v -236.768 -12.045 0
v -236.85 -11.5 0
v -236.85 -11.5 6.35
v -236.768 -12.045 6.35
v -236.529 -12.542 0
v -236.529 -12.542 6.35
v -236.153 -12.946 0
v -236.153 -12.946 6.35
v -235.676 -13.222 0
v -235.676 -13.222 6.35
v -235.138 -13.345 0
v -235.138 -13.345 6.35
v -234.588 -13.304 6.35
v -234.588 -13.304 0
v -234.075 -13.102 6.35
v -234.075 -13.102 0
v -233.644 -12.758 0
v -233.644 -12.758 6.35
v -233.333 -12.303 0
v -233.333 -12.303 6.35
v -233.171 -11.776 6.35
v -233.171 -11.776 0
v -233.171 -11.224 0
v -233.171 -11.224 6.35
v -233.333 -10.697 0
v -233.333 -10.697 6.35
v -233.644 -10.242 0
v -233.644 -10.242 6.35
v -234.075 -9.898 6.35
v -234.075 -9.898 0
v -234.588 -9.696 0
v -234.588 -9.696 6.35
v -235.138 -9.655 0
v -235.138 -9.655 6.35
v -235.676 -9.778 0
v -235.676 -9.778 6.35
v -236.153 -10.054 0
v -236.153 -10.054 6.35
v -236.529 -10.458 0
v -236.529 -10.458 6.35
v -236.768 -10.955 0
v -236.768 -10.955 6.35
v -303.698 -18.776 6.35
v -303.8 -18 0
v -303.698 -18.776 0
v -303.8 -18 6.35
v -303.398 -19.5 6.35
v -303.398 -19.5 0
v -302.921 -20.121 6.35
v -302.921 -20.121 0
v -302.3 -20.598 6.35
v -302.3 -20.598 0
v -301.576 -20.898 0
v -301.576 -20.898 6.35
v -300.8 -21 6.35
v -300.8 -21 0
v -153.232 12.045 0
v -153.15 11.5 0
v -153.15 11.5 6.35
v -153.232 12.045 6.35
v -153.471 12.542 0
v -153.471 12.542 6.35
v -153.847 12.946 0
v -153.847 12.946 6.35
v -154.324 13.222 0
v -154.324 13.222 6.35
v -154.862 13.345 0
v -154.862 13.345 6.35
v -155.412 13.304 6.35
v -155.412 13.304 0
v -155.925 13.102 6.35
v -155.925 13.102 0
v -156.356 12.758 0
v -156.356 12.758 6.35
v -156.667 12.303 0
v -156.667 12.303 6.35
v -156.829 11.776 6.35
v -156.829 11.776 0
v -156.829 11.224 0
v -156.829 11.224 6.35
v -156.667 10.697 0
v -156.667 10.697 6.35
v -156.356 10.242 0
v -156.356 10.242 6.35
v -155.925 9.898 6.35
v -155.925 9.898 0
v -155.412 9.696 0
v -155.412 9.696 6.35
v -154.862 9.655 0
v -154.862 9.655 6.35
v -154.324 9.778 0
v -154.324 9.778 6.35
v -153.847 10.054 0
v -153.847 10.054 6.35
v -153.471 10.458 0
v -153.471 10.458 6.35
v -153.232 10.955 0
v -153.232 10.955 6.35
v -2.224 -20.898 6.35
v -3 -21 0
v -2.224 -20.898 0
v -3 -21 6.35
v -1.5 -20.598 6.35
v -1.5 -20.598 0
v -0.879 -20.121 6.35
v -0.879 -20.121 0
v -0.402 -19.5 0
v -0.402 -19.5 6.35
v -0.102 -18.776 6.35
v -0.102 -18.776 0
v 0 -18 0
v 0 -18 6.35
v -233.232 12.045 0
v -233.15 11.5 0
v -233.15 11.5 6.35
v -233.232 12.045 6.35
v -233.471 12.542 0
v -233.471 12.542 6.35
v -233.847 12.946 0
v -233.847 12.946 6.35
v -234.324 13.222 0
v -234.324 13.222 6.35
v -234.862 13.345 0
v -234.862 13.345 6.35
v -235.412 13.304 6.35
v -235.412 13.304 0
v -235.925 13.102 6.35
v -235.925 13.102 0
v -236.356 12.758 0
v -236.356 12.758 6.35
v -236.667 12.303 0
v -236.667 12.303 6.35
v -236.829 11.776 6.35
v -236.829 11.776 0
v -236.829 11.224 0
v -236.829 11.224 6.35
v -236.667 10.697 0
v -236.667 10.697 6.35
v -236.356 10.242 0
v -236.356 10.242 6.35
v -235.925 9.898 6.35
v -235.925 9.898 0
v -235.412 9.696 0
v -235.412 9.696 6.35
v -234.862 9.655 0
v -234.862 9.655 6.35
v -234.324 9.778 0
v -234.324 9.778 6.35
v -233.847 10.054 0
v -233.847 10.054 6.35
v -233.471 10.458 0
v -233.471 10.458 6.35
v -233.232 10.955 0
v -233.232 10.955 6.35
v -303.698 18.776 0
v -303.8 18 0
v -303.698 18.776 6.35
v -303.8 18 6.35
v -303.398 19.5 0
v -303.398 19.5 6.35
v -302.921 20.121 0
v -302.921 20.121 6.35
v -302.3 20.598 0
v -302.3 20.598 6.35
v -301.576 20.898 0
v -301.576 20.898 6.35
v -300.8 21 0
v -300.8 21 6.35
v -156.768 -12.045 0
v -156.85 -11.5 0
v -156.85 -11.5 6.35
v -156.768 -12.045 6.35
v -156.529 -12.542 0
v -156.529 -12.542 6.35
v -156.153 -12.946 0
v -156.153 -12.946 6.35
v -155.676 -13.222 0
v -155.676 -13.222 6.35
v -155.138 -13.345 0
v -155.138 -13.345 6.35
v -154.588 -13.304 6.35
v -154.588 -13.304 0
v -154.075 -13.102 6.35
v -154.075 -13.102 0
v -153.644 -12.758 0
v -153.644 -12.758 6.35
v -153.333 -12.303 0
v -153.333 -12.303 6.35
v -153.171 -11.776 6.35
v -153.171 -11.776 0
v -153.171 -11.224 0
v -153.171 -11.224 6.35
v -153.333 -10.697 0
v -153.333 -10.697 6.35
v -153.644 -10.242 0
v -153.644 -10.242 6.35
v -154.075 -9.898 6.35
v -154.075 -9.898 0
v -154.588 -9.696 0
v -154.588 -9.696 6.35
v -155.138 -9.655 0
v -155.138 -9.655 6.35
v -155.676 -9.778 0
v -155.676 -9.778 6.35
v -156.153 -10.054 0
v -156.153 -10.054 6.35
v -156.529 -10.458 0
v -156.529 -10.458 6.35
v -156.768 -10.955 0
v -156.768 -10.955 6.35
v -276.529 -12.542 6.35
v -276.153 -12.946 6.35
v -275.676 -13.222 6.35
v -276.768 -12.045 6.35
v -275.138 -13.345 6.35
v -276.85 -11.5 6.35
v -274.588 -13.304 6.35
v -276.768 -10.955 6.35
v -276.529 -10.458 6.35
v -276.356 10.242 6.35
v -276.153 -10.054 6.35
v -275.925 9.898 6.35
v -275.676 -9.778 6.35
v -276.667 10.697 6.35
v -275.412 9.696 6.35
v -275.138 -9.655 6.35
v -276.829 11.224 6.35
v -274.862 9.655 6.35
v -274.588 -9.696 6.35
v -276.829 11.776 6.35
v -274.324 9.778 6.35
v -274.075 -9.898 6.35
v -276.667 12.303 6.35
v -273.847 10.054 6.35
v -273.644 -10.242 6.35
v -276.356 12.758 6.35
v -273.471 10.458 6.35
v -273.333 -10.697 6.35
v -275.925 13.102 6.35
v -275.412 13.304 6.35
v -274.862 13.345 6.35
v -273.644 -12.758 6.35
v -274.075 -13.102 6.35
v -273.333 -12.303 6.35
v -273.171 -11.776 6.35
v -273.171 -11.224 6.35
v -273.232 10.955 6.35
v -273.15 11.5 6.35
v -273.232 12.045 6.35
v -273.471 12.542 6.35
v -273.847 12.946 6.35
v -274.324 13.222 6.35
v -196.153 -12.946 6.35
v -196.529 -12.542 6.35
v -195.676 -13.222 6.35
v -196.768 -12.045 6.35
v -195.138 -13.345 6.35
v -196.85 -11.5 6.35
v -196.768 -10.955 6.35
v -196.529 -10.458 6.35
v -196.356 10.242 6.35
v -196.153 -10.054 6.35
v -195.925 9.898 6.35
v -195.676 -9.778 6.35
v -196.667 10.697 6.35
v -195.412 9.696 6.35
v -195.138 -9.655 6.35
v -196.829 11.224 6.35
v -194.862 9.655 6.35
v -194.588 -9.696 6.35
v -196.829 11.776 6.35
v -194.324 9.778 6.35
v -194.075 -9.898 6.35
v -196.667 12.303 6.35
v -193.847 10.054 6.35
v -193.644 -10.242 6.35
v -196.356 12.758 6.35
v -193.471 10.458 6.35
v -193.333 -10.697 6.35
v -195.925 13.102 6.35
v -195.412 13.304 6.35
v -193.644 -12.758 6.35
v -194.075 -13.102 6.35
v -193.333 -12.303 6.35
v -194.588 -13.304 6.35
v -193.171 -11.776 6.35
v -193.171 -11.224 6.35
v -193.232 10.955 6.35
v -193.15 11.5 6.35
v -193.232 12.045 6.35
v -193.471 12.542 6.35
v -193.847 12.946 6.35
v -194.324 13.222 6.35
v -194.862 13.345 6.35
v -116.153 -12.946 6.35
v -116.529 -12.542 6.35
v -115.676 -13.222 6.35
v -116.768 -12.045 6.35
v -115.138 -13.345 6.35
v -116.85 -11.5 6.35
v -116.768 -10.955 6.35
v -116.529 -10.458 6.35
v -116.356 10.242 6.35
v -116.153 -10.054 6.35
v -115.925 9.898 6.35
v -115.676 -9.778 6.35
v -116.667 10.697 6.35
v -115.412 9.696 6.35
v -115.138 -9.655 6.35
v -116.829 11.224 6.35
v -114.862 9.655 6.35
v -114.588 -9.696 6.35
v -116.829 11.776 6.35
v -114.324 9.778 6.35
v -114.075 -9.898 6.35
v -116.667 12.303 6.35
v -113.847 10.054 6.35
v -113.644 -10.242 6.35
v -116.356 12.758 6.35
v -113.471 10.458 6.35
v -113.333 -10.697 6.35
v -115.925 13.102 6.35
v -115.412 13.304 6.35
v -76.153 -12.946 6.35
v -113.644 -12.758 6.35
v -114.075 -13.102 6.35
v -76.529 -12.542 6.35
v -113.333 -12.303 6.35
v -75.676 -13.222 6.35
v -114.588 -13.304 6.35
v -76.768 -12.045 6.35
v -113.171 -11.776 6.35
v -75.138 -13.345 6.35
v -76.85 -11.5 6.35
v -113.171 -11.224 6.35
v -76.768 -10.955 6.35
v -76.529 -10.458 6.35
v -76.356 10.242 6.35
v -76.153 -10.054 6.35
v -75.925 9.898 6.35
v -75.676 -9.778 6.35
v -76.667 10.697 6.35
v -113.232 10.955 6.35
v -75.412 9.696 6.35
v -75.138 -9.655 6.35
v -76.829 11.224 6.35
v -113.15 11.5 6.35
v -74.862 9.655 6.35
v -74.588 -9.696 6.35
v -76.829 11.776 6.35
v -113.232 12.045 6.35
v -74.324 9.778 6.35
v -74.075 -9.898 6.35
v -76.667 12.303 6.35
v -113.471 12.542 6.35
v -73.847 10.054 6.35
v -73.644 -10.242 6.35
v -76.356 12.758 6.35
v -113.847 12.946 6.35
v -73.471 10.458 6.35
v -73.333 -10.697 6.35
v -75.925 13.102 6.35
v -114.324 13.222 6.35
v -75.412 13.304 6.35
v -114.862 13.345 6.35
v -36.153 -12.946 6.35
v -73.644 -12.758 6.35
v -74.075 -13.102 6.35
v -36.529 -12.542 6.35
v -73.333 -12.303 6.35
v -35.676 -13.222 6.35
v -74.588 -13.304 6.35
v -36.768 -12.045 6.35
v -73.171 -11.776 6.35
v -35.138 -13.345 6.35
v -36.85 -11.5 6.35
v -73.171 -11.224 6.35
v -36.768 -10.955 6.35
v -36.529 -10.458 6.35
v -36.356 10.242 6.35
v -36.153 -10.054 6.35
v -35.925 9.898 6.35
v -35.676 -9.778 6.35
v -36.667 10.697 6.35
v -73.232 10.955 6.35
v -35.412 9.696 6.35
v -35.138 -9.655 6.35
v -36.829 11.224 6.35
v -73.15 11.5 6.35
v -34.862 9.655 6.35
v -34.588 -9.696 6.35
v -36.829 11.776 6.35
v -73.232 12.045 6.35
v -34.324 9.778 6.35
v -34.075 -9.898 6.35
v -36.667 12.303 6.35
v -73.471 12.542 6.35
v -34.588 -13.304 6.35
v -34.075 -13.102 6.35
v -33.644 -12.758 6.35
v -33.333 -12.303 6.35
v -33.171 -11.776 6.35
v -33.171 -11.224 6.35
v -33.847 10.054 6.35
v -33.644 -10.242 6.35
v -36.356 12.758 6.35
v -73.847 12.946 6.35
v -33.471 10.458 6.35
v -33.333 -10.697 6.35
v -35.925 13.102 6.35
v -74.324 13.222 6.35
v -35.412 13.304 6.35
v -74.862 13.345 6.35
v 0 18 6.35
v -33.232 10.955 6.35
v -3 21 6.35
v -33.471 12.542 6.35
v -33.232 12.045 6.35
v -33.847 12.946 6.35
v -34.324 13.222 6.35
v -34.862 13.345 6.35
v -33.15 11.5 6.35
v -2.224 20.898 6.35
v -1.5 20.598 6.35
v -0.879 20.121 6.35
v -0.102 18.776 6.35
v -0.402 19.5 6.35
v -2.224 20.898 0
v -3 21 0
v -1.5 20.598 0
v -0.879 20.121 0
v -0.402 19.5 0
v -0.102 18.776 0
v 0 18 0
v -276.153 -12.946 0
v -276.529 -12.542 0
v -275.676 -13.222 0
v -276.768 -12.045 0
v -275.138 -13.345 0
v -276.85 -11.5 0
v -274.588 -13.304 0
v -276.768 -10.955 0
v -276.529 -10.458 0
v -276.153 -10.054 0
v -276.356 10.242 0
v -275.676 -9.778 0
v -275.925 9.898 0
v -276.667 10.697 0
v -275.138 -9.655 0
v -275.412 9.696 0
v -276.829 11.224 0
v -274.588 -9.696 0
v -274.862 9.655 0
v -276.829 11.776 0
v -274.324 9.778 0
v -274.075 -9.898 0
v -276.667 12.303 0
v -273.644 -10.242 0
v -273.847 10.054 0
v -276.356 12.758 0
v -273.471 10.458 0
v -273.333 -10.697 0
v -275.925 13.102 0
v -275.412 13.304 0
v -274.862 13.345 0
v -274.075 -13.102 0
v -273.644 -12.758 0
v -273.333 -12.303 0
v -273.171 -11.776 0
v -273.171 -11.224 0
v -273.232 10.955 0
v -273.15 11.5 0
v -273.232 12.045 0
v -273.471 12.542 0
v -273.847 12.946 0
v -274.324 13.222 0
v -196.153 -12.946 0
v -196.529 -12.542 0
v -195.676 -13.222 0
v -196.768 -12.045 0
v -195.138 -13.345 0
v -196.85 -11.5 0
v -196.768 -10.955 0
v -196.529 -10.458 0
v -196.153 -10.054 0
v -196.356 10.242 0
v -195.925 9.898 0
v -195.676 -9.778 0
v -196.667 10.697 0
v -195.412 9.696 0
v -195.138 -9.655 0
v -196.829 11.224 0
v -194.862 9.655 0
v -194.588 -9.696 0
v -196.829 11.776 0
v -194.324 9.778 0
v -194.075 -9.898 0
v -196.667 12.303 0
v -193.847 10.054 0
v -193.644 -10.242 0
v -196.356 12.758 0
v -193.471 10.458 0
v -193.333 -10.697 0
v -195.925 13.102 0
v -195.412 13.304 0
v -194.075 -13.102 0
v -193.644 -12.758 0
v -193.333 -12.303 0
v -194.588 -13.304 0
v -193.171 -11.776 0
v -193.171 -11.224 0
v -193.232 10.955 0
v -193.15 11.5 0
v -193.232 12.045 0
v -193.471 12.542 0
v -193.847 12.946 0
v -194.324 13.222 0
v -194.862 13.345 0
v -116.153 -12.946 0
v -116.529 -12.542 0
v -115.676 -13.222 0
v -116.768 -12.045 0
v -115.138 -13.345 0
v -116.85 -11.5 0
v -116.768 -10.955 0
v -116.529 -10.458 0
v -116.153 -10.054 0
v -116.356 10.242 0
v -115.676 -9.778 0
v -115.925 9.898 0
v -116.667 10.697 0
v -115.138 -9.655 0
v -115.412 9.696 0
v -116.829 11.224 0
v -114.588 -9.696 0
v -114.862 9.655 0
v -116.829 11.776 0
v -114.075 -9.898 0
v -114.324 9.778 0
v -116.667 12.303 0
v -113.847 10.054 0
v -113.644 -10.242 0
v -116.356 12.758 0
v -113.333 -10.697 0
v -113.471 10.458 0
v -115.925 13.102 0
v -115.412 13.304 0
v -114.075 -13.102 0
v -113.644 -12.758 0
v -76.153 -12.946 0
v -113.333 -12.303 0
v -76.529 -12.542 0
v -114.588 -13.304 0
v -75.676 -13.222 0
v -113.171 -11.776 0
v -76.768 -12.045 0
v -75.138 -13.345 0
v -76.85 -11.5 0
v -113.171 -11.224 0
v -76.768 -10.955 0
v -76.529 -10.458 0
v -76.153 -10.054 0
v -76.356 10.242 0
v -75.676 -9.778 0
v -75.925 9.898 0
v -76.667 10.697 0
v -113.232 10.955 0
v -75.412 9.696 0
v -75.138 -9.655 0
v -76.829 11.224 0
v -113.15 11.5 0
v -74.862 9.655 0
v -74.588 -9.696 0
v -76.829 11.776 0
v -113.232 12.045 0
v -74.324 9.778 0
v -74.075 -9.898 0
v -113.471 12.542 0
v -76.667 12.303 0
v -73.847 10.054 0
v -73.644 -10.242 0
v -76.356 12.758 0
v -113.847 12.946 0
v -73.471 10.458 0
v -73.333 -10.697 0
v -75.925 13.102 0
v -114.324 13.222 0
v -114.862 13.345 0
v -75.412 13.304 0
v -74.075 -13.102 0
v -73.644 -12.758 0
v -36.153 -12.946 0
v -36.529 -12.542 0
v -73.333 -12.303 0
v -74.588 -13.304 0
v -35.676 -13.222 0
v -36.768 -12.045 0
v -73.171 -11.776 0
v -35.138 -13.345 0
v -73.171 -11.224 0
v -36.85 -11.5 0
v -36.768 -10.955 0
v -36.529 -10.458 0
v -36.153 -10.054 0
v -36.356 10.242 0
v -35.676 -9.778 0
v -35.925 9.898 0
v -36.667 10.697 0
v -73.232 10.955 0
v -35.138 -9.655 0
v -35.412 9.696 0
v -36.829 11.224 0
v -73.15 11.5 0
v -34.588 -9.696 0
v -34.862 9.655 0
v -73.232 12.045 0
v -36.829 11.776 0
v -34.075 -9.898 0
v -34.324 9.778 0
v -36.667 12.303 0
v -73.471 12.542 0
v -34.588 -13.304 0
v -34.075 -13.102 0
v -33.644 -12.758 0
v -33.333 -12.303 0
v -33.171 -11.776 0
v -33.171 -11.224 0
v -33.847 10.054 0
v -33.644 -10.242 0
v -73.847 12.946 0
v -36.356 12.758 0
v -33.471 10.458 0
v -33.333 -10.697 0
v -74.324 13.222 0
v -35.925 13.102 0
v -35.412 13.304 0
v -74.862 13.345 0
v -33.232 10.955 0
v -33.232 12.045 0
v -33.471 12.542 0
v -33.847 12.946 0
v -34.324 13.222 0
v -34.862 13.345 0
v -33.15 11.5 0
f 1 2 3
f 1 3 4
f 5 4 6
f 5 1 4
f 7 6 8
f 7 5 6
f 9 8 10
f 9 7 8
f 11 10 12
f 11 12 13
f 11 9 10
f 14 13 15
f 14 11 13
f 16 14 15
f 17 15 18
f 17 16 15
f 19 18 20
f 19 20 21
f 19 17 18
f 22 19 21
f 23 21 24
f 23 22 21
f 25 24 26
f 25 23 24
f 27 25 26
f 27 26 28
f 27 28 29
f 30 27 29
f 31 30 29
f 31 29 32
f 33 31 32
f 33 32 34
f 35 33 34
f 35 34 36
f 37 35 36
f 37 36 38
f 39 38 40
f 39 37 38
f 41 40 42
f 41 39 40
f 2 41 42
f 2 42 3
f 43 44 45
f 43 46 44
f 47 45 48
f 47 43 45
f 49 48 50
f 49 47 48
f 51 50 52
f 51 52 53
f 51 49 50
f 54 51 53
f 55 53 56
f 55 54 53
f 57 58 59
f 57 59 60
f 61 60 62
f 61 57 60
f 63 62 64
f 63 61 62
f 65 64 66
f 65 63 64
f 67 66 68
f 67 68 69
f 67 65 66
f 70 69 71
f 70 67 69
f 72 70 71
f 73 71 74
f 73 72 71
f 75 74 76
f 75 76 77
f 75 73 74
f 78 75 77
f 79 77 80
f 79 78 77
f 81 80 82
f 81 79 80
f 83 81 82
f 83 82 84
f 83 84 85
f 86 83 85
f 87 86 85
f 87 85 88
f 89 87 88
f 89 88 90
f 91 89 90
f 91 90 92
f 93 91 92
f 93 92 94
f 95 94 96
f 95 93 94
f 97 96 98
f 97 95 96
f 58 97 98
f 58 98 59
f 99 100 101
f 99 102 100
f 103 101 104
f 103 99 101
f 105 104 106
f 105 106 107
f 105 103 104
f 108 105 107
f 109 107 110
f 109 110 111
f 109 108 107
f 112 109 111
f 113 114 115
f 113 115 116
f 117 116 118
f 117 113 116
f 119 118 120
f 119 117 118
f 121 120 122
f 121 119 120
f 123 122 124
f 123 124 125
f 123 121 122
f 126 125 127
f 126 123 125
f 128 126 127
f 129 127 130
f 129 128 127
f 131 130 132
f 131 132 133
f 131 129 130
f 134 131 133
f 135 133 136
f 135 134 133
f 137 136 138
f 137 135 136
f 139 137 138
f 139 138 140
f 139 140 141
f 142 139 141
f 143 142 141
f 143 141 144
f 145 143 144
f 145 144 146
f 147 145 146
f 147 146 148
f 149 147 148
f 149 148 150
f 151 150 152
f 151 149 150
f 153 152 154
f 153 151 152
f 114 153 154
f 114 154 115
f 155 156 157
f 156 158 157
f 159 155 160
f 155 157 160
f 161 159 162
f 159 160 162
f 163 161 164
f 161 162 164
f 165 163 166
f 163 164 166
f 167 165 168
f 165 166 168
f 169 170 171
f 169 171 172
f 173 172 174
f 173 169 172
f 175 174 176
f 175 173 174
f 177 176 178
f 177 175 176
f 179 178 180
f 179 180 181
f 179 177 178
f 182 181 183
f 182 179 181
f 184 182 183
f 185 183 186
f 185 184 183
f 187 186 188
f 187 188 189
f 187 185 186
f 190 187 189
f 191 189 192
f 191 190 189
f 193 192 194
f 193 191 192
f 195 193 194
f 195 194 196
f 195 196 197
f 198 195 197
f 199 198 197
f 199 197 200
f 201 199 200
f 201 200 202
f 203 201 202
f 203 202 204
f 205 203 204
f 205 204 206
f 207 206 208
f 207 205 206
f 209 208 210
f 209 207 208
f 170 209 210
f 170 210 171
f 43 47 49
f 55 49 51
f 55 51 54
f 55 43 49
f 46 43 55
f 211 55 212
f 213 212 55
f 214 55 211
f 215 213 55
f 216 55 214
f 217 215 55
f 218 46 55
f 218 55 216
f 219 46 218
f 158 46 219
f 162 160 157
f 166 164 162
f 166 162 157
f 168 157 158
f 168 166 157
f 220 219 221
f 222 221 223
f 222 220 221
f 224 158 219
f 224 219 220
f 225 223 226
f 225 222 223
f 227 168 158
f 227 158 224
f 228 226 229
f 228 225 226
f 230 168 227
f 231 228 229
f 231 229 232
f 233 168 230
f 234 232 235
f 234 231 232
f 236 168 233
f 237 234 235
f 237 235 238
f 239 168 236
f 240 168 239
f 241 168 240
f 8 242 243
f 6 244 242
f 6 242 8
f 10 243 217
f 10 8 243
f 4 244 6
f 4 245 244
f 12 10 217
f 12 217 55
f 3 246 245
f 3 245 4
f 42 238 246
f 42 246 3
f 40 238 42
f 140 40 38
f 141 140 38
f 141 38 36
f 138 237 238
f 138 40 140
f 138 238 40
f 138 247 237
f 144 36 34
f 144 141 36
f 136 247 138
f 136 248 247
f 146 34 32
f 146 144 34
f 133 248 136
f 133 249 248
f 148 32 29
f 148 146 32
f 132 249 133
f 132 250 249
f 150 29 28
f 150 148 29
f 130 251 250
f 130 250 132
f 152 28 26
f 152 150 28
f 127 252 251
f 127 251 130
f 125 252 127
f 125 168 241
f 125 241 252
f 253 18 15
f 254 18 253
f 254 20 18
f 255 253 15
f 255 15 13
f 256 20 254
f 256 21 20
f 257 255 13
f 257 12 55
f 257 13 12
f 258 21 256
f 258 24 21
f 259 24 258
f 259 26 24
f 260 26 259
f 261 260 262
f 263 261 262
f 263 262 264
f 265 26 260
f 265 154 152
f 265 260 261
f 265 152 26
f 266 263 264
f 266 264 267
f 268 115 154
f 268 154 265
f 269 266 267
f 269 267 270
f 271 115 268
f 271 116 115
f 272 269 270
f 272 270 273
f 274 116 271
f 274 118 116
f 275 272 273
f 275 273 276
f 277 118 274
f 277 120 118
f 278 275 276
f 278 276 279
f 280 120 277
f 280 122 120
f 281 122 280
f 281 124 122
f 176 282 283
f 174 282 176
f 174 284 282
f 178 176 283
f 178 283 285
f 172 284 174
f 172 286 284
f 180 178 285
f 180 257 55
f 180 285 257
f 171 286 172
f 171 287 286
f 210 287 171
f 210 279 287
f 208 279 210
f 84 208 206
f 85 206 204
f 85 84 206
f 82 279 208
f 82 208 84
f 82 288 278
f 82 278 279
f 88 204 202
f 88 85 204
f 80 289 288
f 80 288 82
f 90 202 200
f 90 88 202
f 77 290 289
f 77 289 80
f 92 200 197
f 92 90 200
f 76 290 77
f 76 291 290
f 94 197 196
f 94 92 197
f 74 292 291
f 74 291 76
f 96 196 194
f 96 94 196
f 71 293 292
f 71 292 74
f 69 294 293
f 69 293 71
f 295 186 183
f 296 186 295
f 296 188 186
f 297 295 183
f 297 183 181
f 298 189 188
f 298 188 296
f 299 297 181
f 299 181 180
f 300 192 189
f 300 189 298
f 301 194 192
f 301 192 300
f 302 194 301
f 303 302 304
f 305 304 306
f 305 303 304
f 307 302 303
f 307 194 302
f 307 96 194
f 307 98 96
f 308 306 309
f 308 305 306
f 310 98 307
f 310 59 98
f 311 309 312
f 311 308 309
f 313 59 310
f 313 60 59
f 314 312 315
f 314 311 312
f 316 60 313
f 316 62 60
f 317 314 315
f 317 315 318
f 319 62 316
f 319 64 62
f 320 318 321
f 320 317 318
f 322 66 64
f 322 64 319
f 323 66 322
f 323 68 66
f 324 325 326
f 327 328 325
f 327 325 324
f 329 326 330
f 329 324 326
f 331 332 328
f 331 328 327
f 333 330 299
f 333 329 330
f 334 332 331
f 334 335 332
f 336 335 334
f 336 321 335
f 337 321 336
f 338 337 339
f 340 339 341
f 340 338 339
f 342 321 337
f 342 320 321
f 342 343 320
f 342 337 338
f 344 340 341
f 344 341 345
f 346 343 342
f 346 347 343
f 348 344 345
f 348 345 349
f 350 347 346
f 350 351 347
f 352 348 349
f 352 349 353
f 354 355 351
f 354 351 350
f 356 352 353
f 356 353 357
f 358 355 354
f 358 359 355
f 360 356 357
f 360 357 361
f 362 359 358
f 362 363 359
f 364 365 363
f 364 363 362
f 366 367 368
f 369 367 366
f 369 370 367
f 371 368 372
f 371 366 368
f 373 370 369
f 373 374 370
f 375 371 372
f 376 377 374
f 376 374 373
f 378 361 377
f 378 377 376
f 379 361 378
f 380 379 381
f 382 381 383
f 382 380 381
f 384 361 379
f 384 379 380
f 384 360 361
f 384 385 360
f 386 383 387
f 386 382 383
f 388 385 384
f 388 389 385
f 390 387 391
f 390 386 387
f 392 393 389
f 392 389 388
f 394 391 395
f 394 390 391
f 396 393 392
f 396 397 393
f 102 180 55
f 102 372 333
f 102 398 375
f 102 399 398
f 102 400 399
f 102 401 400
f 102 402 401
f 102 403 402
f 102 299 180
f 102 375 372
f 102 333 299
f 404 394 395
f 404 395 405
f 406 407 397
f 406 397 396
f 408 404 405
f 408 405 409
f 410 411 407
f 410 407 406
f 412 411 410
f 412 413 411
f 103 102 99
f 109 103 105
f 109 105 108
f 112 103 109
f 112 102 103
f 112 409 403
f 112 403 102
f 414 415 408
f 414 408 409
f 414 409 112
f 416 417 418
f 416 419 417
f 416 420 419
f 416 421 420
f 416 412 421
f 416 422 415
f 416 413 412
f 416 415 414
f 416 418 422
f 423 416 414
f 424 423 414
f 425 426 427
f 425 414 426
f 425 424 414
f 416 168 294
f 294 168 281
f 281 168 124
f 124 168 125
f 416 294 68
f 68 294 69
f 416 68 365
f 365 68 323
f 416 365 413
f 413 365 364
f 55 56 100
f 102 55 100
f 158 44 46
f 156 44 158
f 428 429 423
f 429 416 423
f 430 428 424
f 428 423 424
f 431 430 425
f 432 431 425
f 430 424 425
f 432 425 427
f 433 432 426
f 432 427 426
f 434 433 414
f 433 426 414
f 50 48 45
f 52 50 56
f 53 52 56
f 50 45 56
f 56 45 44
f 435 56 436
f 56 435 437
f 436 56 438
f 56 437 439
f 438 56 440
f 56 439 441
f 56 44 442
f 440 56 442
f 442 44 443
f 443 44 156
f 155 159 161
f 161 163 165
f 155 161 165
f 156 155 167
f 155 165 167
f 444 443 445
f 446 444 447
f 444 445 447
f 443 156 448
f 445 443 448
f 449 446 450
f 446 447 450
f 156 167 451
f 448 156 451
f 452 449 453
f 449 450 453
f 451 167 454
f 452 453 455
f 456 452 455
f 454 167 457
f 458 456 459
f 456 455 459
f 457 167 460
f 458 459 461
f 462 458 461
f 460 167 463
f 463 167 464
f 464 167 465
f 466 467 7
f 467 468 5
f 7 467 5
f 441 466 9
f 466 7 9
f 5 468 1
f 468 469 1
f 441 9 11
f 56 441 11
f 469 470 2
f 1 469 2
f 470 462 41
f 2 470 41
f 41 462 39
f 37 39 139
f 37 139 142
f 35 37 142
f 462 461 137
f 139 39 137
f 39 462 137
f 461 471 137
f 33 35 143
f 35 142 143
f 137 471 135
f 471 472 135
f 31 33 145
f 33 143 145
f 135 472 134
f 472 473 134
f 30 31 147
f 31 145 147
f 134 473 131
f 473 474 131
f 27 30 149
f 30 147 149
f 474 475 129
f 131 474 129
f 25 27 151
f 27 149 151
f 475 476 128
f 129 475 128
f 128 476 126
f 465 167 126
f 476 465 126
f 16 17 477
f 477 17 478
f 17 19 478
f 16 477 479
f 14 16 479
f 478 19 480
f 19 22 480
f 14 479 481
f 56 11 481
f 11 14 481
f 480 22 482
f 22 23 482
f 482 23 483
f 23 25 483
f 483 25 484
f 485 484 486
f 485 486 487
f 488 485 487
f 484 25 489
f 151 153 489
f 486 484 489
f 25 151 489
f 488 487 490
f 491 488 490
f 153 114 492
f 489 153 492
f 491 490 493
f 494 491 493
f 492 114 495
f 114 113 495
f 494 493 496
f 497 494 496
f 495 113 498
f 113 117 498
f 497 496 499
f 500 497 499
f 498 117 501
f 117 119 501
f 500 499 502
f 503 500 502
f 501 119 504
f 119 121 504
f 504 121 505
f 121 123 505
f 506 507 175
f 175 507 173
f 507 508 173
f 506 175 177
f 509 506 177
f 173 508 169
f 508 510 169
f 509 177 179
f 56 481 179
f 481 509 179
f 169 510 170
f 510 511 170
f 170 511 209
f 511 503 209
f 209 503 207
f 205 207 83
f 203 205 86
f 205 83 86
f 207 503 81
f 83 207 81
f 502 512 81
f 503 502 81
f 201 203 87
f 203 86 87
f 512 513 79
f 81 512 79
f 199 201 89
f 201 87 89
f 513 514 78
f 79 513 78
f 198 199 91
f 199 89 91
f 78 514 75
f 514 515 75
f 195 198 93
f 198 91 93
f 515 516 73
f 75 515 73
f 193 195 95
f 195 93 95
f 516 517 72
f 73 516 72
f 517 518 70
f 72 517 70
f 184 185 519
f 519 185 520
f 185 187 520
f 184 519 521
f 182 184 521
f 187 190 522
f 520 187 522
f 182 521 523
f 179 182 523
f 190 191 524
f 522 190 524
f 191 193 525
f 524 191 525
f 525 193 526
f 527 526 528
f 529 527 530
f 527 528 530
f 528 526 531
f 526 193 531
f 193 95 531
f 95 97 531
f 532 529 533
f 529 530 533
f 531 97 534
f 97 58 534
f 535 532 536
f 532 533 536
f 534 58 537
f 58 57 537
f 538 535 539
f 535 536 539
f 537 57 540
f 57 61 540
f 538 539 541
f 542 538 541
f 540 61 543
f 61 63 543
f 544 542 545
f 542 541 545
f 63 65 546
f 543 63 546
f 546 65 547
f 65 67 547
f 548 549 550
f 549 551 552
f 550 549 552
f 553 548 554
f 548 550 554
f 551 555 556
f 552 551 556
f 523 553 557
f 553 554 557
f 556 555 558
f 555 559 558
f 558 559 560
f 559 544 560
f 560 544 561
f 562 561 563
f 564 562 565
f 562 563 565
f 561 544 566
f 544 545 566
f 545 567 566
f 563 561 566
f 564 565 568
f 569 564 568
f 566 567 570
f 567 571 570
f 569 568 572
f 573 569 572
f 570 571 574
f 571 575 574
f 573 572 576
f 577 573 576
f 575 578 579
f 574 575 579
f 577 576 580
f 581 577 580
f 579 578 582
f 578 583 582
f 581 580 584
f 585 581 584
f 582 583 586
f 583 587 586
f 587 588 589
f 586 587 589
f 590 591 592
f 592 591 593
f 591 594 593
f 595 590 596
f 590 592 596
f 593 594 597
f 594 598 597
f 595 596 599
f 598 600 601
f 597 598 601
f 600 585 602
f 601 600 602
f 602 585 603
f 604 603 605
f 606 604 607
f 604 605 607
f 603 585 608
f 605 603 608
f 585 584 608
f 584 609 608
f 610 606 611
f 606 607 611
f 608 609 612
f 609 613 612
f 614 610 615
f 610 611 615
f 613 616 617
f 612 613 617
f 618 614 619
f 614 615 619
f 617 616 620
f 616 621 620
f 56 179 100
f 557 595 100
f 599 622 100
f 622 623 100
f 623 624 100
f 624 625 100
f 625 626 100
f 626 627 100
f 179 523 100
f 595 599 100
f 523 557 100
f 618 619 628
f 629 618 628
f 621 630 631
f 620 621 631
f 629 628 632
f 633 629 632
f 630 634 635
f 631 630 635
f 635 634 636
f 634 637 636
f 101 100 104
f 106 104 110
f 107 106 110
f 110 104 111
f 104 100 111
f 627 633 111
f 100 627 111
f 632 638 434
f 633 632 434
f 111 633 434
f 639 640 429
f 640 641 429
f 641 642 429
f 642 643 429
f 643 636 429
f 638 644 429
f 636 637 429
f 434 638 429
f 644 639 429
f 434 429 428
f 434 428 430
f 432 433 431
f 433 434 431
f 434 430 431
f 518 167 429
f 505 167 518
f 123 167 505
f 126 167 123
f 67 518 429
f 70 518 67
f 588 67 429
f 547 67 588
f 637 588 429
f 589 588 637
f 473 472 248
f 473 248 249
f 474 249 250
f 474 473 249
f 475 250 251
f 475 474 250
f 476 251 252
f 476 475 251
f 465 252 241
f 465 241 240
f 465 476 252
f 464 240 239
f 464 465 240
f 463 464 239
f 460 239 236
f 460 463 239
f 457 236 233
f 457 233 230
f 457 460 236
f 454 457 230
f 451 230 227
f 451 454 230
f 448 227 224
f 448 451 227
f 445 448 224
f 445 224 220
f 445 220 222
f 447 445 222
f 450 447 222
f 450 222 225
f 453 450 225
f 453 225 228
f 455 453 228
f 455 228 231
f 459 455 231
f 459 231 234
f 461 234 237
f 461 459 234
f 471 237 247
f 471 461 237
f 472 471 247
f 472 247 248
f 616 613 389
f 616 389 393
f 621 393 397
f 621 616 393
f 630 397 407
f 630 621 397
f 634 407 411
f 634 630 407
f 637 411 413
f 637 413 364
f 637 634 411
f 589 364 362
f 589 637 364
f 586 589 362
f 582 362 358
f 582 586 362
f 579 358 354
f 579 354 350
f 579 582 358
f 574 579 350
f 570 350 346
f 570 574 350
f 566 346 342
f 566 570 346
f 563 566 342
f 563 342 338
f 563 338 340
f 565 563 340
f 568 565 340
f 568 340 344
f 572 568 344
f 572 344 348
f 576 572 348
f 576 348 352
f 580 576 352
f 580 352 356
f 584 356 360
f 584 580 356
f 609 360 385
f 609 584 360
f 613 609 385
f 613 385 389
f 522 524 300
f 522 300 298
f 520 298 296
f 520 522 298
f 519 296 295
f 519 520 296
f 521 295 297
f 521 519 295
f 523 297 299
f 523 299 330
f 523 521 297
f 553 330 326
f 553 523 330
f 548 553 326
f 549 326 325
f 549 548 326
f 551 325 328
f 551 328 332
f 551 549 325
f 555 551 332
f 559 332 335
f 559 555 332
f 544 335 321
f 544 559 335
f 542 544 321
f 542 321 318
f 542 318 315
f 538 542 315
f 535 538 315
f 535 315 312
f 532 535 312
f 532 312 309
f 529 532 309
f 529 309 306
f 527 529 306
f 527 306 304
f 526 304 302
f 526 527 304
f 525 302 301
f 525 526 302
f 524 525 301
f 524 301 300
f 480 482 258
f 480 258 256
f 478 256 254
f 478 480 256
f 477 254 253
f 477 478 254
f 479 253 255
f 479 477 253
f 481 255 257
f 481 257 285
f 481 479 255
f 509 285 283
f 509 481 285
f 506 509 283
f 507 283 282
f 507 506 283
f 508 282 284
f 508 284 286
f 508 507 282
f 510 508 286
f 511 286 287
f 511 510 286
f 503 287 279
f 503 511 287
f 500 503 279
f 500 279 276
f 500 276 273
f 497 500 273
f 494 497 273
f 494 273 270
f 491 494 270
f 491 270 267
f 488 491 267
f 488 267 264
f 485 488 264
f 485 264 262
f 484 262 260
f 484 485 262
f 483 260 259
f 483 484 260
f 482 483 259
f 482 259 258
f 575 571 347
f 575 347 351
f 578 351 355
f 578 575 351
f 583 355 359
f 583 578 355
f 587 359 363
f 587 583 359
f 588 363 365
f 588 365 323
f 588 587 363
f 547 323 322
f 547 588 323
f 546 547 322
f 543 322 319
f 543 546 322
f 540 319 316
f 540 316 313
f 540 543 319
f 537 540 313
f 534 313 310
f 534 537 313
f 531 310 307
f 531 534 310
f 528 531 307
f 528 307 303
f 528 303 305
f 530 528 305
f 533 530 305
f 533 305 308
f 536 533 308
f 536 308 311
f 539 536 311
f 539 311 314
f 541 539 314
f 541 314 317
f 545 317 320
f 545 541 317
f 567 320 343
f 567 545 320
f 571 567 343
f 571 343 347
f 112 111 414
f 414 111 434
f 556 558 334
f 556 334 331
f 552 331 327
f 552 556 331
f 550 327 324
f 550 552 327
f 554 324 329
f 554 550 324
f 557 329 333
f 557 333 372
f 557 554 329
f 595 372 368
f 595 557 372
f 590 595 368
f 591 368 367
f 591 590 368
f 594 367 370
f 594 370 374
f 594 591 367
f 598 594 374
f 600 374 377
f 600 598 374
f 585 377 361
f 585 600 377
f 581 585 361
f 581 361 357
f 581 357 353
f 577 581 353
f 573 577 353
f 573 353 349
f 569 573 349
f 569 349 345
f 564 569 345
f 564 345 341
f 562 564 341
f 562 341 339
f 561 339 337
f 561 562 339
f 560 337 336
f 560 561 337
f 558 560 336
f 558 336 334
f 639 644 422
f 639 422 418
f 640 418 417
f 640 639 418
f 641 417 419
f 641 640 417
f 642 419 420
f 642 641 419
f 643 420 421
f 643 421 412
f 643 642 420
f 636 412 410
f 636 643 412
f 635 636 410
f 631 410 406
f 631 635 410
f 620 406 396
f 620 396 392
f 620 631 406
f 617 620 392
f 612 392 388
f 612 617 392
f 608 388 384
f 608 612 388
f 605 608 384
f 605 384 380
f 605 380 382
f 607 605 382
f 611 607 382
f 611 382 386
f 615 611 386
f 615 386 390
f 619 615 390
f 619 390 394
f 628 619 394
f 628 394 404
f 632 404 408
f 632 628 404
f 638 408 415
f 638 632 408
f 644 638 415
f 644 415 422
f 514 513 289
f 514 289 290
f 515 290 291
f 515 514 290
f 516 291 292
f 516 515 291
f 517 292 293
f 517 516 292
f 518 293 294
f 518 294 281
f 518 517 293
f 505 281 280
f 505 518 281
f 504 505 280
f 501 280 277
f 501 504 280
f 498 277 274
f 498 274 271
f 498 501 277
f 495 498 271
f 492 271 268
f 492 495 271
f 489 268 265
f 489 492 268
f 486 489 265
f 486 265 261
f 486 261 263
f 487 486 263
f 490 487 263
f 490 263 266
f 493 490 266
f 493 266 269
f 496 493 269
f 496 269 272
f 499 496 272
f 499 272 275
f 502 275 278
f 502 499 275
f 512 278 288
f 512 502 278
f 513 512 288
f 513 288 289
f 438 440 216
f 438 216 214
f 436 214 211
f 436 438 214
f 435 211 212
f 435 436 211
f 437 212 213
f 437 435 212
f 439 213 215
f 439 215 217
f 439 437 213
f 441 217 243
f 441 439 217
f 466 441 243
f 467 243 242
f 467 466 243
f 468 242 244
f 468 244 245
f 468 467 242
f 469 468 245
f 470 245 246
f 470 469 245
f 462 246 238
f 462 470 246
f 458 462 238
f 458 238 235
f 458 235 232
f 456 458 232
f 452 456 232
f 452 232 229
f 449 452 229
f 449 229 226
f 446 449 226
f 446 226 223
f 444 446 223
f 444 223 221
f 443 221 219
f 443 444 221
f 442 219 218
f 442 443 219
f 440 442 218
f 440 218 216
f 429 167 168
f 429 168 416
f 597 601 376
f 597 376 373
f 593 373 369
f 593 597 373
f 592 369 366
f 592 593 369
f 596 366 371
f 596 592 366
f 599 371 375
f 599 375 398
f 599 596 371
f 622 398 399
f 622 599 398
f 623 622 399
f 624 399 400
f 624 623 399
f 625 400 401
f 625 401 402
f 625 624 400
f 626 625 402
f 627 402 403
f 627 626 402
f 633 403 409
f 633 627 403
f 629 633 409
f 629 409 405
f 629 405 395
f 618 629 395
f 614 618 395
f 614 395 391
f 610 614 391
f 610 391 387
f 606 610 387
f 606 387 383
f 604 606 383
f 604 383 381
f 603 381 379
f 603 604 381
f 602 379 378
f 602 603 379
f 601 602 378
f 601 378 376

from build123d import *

# Parameters (mm, degrees)
SKETCH1_W           = 303.8
SKETCH1_H           = 42
SKETCH1_R           = 1.85
BOSS_EXTRUDE1_DEPTH = 6.35
FILLET1_R           = 3


with BuildPart() as part:
    # Sketch1 → Boss-Extrude1 (new body)
    with BuildSketch(Plane.XY):
        with Locations((-151.9, 0)):
            Rectangle(SKETCH1_W, SKETCH1_H)
        with Locations((-35, 11.5)):
            Circle(SKETCH1_R, mode=Mode.SUBTRACT)
        with Locations((-75, 11.5)):
            Circle(SKETCH1_R, mode=Mode.SUBTRACT)
        with Locations((-115, 11.5)):
            Circle(SKETCH1_R, mode=Mode.SUBTRACT)
        with Locations((-155, 11.5)):
            Circle(SKETCH1_R, mode=Mode.SUBTRACT)
        with Locations((-195, 11.5)):
            Circle(SKETCH1_R, mode=Mode.SUBTRACT)
        with Locations((-235, 11.5)):
            Circle(SKETCH1_R, mode=Mode.SUBTRACT)
        with Locations((-275, 11.5)):
            Circle(SKETCH1_R, mode=Mode.SUBTRACT)
        with Locations(Location((-275, -11.5, 0), (0, 0, 180))):
            Circle(SKETCH1_R, mode=Mode.SUBTRACT)
        with Locations(Location((-235, -11.5, 0), (0, 0, 180))):
            Circle(SKETCH1_R, mode=Mode.SUBTRACT)
        with Locations(Location((-195, -11.5, 0), (0, 0, 180))):
            Circle(SKETCH1_R, mode=Mode.SUBTRACT)
        with Locations(Location((-155, -11.5, 0), (0, 0, 180))):
            Circle(SKETCH1_R, mode=Mode.SUBTRACT)
        with Locations(Location((-115, -11.5, 0), (0, 0, 180))):
            Circle(SKETCH1_R, mode=Mode.SUBTRACT)
        with Locations(Location((-75, -11.5, 0), (0, 0, 180))):
            Circle(SKETCH1_R, mode=Mode.SUBTRACT)
        with Locations(Location((-35, -11.5, 0), (0, 0, 180))):
            Circle(SKETCH1_R, mode=Mode.SUBTRACT)
    extrude(amount=BOSS_EXTRUDE1_DEPTH)

    # Fillet1
    fillet1_edges = [part.edges().sort_by_distance(p)[0] for p in [
        (0, -21, 3.175),
        (-303.8, -21, 3.175),
        (-303.8, 21, 3.175),
        (0, 21, 3.175),
    ]]
    fillet(fillet1_edges, radius=FILLET1_R)


solid = part.part
